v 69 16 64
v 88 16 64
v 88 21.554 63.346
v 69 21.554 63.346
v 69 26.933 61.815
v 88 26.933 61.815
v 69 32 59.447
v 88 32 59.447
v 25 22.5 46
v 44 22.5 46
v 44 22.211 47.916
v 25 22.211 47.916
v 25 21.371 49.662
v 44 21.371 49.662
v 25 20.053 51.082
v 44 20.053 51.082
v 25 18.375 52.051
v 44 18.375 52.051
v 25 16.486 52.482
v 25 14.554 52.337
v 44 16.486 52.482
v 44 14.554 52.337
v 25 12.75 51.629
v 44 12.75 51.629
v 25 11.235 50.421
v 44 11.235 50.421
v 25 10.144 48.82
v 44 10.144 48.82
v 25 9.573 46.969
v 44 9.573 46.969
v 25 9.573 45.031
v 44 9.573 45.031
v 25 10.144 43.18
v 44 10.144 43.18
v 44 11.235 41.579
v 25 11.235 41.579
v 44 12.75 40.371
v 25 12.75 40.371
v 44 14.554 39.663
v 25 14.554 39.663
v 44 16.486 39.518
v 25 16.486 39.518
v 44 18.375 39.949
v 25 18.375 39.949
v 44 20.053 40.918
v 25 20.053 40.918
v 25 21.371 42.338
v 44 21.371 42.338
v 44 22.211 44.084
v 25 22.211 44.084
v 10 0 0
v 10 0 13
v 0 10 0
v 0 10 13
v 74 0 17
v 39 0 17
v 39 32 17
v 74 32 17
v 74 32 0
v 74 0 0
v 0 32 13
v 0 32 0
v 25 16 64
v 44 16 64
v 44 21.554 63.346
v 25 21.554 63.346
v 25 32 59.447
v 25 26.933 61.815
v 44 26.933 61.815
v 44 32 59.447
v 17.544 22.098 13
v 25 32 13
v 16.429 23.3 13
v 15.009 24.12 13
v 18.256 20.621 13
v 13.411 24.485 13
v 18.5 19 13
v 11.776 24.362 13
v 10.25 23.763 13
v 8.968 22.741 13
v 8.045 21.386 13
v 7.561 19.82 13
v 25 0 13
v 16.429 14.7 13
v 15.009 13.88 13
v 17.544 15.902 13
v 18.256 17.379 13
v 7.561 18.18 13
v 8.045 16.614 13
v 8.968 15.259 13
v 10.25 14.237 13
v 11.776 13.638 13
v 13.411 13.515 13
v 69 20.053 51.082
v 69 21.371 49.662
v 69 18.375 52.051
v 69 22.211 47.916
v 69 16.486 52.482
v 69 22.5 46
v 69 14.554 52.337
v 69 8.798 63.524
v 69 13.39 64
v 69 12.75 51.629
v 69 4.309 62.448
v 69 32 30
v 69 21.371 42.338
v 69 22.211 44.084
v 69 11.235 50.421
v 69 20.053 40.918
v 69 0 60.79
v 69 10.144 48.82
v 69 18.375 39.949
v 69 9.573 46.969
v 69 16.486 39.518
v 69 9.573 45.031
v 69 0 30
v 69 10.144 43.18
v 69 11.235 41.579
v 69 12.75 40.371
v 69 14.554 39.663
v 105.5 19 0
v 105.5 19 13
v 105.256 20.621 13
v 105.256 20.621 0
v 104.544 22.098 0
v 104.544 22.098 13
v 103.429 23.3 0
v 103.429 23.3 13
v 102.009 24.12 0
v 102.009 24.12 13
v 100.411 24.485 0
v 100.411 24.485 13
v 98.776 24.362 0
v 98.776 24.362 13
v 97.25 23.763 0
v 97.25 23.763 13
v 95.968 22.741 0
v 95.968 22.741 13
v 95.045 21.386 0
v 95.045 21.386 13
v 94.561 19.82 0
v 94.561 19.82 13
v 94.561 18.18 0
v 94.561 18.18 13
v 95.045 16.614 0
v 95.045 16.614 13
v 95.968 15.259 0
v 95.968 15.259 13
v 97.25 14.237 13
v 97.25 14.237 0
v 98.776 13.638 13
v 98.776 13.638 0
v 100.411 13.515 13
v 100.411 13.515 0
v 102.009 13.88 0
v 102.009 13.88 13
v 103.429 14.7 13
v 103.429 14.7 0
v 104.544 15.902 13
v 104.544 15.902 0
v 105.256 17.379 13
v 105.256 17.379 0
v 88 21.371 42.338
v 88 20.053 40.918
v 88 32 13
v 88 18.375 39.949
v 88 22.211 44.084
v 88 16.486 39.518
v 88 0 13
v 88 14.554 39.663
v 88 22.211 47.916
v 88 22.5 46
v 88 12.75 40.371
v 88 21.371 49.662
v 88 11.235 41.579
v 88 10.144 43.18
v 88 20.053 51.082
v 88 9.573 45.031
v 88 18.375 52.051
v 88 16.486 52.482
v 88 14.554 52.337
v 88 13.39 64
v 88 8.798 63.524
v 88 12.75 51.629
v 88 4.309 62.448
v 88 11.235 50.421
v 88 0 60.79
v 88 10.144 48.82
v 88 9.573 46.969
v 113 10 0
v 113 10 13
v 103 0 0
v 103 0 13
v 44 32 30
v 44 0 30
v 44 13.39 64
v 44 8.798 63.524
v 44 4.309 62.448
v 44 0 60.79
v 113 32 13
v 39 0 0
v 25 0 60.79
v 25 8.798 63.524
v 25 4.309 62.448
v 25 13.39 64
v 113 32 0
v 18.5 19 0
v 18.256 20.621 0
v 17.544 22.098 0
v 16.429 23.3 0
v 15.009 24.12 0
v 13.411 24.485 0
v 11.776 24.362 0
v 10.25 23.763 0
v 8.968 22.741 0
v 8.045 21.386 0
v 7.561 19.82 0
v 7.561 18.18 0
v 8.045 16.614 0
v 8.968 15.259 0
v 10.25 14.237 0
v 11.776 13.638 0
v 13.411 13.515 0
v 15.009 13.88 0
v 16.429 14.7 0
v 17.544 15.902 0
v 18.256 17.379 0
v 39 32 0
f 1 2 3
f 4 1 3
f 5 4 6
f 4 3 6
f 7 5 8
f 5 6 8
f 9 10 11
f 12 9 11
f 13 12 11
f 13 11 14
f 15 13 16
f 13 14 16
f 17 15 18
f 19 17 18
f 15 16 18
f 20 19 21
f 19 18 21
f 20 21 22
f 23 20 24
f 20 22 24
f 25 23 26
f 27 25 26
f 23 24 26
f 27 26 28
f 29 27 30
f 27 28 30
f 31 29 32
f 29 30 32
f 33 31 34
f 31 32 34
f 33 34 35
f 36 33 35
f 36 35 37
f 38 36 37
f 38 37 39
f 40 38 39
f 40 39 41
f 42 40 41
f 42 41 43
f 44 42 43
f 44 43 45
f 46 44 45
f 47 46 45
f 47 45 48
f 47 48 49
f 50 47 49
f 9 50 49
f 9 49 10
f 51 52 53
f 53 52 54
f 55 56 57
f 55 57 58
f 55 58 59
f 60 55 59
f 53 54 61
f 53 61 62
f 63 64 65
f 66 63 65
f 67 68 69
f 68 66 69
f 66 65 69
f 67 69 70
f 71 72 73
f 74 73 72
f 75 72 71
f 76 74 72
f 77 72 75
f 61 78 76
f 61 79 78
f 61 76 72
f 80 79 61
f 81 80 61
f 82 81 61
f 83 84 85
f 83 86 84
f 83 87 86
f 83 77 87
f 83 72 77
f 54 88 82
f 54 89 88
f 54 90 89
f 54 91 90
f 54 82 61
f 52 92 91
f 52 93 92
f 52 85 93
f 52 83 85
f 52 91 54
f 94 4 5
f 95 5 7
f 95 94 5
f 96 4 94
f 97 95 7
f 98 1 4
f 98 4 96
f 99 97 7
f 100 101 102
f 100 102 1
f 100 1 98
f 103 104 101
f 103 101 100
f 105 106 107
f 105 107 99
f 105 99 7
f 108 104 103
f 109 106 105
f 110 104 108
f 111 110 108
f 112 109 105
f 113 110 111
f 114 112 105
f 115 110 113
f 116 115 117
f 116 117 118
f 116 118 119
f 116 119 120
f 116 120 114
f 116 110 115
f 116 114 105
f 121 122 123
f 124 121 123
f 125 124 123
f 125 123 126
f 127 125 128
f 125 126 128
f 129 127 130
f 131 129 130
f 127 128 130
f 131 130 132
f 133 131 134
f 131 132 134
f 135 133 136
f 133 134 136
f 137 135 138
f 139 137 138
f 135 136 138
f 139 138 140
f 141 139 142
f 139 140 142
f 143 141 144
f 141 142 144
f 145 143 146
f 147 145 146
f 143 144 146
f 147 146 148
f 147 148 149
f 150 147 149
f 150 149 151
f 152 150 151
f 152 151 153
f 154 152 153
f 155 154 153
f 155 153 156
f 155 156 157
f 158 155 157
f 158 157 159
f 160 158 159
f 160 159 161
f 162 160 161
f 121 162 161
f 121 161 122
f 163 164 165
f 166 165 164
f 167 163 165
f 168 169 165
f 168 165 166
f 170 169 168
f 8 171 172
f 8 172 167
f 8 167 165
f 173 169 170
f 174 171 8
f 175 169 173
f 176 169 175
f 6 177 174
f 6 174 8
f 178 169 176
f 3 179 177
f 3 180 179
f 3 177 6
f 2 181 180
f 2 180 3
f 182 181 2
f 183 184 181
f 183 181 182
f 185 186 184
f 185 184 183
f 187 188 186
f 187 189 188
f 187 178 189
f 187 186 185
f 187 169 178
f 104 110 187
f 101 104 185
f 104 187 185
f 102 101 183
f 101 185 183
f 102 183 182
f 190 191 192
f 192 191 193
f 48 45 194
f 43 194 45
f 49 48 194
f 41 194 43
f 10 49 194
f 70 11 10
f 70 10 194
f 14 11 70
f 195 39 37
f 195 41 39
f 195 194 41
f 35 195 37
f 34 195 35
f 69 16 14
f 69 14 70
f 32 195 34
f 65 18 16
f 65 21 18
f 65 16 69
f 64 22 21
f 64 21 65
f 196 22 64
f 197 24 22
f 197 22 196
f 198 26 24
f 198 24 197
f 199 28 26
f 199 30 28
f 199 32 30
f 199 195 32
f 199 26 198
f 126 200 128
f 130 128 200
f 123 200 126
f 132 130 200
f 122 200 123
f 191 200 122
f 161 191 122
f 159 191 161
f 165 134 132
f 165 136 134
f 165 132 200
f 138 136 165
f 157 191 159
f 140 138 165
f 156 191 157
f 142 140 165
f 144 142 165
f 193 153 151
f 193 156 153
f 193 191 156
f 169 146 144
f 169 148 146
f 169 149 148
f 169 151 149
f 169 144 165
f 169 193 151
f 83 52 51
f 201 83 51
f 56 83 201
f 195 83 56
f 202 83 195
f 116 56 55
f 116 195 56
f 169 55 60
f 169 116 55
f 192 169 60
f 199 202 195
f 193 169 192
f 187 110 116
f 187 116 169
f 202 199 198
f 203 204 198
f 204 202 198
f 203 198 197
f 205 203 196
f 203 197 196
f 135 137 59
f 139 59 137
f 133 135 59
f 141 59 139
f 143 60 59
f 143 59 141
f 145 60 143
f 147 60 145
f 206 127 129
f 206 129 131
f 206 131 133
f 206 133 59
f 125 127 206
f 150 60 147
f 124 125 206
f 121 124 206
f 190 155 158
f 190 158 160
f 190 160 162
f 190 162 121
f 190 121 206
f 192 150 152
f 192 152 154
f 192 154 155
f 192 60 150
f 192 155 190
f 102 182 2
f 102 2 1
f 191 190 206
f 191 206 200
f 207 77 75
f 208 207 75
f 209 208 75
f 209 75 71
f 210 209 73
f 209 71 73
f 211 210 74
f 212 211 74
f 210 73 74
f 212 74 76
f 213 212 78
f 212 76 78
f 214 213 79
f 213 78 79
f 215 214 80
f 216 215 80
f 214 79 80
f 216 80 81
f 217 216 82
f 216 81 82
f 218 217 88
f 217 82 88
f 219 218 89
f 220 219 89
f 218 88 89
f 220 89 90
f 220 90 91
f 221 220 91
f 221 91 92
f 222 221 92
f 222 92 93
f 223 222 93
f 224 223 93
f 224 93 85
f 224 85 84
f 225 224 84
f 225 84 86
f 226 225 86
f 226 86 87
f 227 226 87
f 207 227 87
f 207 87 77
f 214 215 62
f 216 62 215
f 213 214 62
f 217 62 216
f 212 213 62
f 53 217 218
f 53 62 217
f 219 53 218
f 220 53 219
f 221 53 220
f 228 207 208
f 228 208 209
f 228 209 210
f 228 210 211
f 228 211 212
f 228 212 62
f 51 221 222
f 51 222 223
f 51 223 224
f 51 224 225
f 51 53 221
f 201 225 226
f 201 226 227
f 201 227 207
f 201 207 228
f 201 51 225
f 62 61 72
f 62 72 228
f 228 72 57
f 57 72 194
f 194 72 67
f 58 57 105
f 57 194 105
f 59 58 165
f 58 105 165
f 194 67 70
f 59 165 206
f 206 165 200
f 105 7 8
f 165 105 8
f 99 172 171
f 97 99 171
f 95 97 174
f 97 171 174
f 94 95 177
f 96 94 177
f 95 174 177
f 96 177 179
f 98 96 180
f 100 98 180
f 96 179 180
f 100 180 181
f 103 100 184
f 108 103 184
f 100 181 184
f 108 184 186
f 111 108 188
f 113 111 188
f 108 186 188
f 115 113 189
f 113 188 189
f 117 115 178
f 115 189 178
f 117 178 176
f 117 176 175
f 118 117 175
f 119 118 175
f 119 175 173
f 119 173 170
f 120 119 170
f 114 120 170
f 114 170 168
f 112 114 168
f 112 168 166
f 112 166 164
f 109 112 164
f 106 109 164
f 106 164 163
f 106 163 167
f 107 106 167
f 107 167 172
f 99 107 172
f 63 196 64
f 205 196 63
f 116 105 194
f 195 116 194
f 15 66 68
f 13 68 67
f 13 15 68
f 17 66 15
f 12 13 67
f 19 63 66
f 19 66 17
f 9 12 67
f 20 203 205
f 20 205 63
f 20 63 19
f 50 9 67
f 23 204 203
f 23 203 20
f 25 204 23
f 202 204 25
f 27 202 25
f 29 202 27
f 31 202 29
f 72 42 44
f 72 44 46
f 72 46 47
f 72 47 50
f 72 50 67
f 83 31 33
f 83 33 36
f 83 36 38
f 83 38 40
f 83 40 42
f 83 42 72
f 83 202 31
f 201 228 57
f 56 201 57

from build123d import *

# Parameters (mm, degrees)
F1_DEPTH = 32
F2_R     = 6.5
F3_DEPTH = 88.001
F5_DEPTH = 88.001
F6_R     = 5.5
F7_DEPTH = 13.001
F8_DEPTH = 13.001


with BuildPart() as f1:
    # F0 (on Front) → F1 (new body)
    with BuildSketch(Plane.XZ):
        Polygon((0, 13), (0, 0), (39, 0), (39, 17), (74, 17), (74, 0), (113, 0), (113, 13), (88, 13), (88, 64), (69, 64), (69, 30), (44, 30), (44, 64), (25, 64), (25, 13), align=None)
    extrude(amount=-F1_DEPTH)

    # F2 (on face) → F3 (cut, through all)
    with BuildSketch(Plane.YZ.offset(88)):
        with Locations((16, 46)):
            Circle(F2_R)
    extrude(amount=-F3_DEPTH, mode=Mode.SUBTRACT)

    # F4 (on face) → F5 (cut, through all)
    with BuildSketch(Plane.YZ.offset(88)):
        with BuildLine():
            ThreePointArc((0, 60.790067), (6.535448, 63.059972), (13.389709, 64))
            Line((13.389709, 64), (0, 64))
            Line((0, 64), (0, 60.790067))
        make_face()
        with BuildLine():
            ThreePointArc((16, 64), (24.274438, 62.687848), (32, 59.446899))
            Line((32, 59.446899), (32, 64))
            Line((32, 64), (16, 64))
        make_face()
    extrude(amount=-F5_DEPTH, mode=Mode.SUBTRACT)

    # F6 (on face) → F7 (cut, through all)
    with BuildSketch(Plane.XY.offset(13)):
        Polygon((0, 10), (0, 0), (10, 0), align=None)
        Polygon((113, 10), (103, 0), (113, 0), align=None)
        with Locations((100, 19)):
            Circle(F6_R)
    extrude(amount=-F7_DEPTH, mode=Mode.SUBTRACT)

    # F6 (on face) → F8 (cut, through all)
    with BuildSketch(Plane.XY.offset(13)):
        with Locations((13, 19)):
            Circle(F6_R)
    extrude(amount=-F8_DEPTH, mode=Mode.SUBTRACT)


solid = f1.part
